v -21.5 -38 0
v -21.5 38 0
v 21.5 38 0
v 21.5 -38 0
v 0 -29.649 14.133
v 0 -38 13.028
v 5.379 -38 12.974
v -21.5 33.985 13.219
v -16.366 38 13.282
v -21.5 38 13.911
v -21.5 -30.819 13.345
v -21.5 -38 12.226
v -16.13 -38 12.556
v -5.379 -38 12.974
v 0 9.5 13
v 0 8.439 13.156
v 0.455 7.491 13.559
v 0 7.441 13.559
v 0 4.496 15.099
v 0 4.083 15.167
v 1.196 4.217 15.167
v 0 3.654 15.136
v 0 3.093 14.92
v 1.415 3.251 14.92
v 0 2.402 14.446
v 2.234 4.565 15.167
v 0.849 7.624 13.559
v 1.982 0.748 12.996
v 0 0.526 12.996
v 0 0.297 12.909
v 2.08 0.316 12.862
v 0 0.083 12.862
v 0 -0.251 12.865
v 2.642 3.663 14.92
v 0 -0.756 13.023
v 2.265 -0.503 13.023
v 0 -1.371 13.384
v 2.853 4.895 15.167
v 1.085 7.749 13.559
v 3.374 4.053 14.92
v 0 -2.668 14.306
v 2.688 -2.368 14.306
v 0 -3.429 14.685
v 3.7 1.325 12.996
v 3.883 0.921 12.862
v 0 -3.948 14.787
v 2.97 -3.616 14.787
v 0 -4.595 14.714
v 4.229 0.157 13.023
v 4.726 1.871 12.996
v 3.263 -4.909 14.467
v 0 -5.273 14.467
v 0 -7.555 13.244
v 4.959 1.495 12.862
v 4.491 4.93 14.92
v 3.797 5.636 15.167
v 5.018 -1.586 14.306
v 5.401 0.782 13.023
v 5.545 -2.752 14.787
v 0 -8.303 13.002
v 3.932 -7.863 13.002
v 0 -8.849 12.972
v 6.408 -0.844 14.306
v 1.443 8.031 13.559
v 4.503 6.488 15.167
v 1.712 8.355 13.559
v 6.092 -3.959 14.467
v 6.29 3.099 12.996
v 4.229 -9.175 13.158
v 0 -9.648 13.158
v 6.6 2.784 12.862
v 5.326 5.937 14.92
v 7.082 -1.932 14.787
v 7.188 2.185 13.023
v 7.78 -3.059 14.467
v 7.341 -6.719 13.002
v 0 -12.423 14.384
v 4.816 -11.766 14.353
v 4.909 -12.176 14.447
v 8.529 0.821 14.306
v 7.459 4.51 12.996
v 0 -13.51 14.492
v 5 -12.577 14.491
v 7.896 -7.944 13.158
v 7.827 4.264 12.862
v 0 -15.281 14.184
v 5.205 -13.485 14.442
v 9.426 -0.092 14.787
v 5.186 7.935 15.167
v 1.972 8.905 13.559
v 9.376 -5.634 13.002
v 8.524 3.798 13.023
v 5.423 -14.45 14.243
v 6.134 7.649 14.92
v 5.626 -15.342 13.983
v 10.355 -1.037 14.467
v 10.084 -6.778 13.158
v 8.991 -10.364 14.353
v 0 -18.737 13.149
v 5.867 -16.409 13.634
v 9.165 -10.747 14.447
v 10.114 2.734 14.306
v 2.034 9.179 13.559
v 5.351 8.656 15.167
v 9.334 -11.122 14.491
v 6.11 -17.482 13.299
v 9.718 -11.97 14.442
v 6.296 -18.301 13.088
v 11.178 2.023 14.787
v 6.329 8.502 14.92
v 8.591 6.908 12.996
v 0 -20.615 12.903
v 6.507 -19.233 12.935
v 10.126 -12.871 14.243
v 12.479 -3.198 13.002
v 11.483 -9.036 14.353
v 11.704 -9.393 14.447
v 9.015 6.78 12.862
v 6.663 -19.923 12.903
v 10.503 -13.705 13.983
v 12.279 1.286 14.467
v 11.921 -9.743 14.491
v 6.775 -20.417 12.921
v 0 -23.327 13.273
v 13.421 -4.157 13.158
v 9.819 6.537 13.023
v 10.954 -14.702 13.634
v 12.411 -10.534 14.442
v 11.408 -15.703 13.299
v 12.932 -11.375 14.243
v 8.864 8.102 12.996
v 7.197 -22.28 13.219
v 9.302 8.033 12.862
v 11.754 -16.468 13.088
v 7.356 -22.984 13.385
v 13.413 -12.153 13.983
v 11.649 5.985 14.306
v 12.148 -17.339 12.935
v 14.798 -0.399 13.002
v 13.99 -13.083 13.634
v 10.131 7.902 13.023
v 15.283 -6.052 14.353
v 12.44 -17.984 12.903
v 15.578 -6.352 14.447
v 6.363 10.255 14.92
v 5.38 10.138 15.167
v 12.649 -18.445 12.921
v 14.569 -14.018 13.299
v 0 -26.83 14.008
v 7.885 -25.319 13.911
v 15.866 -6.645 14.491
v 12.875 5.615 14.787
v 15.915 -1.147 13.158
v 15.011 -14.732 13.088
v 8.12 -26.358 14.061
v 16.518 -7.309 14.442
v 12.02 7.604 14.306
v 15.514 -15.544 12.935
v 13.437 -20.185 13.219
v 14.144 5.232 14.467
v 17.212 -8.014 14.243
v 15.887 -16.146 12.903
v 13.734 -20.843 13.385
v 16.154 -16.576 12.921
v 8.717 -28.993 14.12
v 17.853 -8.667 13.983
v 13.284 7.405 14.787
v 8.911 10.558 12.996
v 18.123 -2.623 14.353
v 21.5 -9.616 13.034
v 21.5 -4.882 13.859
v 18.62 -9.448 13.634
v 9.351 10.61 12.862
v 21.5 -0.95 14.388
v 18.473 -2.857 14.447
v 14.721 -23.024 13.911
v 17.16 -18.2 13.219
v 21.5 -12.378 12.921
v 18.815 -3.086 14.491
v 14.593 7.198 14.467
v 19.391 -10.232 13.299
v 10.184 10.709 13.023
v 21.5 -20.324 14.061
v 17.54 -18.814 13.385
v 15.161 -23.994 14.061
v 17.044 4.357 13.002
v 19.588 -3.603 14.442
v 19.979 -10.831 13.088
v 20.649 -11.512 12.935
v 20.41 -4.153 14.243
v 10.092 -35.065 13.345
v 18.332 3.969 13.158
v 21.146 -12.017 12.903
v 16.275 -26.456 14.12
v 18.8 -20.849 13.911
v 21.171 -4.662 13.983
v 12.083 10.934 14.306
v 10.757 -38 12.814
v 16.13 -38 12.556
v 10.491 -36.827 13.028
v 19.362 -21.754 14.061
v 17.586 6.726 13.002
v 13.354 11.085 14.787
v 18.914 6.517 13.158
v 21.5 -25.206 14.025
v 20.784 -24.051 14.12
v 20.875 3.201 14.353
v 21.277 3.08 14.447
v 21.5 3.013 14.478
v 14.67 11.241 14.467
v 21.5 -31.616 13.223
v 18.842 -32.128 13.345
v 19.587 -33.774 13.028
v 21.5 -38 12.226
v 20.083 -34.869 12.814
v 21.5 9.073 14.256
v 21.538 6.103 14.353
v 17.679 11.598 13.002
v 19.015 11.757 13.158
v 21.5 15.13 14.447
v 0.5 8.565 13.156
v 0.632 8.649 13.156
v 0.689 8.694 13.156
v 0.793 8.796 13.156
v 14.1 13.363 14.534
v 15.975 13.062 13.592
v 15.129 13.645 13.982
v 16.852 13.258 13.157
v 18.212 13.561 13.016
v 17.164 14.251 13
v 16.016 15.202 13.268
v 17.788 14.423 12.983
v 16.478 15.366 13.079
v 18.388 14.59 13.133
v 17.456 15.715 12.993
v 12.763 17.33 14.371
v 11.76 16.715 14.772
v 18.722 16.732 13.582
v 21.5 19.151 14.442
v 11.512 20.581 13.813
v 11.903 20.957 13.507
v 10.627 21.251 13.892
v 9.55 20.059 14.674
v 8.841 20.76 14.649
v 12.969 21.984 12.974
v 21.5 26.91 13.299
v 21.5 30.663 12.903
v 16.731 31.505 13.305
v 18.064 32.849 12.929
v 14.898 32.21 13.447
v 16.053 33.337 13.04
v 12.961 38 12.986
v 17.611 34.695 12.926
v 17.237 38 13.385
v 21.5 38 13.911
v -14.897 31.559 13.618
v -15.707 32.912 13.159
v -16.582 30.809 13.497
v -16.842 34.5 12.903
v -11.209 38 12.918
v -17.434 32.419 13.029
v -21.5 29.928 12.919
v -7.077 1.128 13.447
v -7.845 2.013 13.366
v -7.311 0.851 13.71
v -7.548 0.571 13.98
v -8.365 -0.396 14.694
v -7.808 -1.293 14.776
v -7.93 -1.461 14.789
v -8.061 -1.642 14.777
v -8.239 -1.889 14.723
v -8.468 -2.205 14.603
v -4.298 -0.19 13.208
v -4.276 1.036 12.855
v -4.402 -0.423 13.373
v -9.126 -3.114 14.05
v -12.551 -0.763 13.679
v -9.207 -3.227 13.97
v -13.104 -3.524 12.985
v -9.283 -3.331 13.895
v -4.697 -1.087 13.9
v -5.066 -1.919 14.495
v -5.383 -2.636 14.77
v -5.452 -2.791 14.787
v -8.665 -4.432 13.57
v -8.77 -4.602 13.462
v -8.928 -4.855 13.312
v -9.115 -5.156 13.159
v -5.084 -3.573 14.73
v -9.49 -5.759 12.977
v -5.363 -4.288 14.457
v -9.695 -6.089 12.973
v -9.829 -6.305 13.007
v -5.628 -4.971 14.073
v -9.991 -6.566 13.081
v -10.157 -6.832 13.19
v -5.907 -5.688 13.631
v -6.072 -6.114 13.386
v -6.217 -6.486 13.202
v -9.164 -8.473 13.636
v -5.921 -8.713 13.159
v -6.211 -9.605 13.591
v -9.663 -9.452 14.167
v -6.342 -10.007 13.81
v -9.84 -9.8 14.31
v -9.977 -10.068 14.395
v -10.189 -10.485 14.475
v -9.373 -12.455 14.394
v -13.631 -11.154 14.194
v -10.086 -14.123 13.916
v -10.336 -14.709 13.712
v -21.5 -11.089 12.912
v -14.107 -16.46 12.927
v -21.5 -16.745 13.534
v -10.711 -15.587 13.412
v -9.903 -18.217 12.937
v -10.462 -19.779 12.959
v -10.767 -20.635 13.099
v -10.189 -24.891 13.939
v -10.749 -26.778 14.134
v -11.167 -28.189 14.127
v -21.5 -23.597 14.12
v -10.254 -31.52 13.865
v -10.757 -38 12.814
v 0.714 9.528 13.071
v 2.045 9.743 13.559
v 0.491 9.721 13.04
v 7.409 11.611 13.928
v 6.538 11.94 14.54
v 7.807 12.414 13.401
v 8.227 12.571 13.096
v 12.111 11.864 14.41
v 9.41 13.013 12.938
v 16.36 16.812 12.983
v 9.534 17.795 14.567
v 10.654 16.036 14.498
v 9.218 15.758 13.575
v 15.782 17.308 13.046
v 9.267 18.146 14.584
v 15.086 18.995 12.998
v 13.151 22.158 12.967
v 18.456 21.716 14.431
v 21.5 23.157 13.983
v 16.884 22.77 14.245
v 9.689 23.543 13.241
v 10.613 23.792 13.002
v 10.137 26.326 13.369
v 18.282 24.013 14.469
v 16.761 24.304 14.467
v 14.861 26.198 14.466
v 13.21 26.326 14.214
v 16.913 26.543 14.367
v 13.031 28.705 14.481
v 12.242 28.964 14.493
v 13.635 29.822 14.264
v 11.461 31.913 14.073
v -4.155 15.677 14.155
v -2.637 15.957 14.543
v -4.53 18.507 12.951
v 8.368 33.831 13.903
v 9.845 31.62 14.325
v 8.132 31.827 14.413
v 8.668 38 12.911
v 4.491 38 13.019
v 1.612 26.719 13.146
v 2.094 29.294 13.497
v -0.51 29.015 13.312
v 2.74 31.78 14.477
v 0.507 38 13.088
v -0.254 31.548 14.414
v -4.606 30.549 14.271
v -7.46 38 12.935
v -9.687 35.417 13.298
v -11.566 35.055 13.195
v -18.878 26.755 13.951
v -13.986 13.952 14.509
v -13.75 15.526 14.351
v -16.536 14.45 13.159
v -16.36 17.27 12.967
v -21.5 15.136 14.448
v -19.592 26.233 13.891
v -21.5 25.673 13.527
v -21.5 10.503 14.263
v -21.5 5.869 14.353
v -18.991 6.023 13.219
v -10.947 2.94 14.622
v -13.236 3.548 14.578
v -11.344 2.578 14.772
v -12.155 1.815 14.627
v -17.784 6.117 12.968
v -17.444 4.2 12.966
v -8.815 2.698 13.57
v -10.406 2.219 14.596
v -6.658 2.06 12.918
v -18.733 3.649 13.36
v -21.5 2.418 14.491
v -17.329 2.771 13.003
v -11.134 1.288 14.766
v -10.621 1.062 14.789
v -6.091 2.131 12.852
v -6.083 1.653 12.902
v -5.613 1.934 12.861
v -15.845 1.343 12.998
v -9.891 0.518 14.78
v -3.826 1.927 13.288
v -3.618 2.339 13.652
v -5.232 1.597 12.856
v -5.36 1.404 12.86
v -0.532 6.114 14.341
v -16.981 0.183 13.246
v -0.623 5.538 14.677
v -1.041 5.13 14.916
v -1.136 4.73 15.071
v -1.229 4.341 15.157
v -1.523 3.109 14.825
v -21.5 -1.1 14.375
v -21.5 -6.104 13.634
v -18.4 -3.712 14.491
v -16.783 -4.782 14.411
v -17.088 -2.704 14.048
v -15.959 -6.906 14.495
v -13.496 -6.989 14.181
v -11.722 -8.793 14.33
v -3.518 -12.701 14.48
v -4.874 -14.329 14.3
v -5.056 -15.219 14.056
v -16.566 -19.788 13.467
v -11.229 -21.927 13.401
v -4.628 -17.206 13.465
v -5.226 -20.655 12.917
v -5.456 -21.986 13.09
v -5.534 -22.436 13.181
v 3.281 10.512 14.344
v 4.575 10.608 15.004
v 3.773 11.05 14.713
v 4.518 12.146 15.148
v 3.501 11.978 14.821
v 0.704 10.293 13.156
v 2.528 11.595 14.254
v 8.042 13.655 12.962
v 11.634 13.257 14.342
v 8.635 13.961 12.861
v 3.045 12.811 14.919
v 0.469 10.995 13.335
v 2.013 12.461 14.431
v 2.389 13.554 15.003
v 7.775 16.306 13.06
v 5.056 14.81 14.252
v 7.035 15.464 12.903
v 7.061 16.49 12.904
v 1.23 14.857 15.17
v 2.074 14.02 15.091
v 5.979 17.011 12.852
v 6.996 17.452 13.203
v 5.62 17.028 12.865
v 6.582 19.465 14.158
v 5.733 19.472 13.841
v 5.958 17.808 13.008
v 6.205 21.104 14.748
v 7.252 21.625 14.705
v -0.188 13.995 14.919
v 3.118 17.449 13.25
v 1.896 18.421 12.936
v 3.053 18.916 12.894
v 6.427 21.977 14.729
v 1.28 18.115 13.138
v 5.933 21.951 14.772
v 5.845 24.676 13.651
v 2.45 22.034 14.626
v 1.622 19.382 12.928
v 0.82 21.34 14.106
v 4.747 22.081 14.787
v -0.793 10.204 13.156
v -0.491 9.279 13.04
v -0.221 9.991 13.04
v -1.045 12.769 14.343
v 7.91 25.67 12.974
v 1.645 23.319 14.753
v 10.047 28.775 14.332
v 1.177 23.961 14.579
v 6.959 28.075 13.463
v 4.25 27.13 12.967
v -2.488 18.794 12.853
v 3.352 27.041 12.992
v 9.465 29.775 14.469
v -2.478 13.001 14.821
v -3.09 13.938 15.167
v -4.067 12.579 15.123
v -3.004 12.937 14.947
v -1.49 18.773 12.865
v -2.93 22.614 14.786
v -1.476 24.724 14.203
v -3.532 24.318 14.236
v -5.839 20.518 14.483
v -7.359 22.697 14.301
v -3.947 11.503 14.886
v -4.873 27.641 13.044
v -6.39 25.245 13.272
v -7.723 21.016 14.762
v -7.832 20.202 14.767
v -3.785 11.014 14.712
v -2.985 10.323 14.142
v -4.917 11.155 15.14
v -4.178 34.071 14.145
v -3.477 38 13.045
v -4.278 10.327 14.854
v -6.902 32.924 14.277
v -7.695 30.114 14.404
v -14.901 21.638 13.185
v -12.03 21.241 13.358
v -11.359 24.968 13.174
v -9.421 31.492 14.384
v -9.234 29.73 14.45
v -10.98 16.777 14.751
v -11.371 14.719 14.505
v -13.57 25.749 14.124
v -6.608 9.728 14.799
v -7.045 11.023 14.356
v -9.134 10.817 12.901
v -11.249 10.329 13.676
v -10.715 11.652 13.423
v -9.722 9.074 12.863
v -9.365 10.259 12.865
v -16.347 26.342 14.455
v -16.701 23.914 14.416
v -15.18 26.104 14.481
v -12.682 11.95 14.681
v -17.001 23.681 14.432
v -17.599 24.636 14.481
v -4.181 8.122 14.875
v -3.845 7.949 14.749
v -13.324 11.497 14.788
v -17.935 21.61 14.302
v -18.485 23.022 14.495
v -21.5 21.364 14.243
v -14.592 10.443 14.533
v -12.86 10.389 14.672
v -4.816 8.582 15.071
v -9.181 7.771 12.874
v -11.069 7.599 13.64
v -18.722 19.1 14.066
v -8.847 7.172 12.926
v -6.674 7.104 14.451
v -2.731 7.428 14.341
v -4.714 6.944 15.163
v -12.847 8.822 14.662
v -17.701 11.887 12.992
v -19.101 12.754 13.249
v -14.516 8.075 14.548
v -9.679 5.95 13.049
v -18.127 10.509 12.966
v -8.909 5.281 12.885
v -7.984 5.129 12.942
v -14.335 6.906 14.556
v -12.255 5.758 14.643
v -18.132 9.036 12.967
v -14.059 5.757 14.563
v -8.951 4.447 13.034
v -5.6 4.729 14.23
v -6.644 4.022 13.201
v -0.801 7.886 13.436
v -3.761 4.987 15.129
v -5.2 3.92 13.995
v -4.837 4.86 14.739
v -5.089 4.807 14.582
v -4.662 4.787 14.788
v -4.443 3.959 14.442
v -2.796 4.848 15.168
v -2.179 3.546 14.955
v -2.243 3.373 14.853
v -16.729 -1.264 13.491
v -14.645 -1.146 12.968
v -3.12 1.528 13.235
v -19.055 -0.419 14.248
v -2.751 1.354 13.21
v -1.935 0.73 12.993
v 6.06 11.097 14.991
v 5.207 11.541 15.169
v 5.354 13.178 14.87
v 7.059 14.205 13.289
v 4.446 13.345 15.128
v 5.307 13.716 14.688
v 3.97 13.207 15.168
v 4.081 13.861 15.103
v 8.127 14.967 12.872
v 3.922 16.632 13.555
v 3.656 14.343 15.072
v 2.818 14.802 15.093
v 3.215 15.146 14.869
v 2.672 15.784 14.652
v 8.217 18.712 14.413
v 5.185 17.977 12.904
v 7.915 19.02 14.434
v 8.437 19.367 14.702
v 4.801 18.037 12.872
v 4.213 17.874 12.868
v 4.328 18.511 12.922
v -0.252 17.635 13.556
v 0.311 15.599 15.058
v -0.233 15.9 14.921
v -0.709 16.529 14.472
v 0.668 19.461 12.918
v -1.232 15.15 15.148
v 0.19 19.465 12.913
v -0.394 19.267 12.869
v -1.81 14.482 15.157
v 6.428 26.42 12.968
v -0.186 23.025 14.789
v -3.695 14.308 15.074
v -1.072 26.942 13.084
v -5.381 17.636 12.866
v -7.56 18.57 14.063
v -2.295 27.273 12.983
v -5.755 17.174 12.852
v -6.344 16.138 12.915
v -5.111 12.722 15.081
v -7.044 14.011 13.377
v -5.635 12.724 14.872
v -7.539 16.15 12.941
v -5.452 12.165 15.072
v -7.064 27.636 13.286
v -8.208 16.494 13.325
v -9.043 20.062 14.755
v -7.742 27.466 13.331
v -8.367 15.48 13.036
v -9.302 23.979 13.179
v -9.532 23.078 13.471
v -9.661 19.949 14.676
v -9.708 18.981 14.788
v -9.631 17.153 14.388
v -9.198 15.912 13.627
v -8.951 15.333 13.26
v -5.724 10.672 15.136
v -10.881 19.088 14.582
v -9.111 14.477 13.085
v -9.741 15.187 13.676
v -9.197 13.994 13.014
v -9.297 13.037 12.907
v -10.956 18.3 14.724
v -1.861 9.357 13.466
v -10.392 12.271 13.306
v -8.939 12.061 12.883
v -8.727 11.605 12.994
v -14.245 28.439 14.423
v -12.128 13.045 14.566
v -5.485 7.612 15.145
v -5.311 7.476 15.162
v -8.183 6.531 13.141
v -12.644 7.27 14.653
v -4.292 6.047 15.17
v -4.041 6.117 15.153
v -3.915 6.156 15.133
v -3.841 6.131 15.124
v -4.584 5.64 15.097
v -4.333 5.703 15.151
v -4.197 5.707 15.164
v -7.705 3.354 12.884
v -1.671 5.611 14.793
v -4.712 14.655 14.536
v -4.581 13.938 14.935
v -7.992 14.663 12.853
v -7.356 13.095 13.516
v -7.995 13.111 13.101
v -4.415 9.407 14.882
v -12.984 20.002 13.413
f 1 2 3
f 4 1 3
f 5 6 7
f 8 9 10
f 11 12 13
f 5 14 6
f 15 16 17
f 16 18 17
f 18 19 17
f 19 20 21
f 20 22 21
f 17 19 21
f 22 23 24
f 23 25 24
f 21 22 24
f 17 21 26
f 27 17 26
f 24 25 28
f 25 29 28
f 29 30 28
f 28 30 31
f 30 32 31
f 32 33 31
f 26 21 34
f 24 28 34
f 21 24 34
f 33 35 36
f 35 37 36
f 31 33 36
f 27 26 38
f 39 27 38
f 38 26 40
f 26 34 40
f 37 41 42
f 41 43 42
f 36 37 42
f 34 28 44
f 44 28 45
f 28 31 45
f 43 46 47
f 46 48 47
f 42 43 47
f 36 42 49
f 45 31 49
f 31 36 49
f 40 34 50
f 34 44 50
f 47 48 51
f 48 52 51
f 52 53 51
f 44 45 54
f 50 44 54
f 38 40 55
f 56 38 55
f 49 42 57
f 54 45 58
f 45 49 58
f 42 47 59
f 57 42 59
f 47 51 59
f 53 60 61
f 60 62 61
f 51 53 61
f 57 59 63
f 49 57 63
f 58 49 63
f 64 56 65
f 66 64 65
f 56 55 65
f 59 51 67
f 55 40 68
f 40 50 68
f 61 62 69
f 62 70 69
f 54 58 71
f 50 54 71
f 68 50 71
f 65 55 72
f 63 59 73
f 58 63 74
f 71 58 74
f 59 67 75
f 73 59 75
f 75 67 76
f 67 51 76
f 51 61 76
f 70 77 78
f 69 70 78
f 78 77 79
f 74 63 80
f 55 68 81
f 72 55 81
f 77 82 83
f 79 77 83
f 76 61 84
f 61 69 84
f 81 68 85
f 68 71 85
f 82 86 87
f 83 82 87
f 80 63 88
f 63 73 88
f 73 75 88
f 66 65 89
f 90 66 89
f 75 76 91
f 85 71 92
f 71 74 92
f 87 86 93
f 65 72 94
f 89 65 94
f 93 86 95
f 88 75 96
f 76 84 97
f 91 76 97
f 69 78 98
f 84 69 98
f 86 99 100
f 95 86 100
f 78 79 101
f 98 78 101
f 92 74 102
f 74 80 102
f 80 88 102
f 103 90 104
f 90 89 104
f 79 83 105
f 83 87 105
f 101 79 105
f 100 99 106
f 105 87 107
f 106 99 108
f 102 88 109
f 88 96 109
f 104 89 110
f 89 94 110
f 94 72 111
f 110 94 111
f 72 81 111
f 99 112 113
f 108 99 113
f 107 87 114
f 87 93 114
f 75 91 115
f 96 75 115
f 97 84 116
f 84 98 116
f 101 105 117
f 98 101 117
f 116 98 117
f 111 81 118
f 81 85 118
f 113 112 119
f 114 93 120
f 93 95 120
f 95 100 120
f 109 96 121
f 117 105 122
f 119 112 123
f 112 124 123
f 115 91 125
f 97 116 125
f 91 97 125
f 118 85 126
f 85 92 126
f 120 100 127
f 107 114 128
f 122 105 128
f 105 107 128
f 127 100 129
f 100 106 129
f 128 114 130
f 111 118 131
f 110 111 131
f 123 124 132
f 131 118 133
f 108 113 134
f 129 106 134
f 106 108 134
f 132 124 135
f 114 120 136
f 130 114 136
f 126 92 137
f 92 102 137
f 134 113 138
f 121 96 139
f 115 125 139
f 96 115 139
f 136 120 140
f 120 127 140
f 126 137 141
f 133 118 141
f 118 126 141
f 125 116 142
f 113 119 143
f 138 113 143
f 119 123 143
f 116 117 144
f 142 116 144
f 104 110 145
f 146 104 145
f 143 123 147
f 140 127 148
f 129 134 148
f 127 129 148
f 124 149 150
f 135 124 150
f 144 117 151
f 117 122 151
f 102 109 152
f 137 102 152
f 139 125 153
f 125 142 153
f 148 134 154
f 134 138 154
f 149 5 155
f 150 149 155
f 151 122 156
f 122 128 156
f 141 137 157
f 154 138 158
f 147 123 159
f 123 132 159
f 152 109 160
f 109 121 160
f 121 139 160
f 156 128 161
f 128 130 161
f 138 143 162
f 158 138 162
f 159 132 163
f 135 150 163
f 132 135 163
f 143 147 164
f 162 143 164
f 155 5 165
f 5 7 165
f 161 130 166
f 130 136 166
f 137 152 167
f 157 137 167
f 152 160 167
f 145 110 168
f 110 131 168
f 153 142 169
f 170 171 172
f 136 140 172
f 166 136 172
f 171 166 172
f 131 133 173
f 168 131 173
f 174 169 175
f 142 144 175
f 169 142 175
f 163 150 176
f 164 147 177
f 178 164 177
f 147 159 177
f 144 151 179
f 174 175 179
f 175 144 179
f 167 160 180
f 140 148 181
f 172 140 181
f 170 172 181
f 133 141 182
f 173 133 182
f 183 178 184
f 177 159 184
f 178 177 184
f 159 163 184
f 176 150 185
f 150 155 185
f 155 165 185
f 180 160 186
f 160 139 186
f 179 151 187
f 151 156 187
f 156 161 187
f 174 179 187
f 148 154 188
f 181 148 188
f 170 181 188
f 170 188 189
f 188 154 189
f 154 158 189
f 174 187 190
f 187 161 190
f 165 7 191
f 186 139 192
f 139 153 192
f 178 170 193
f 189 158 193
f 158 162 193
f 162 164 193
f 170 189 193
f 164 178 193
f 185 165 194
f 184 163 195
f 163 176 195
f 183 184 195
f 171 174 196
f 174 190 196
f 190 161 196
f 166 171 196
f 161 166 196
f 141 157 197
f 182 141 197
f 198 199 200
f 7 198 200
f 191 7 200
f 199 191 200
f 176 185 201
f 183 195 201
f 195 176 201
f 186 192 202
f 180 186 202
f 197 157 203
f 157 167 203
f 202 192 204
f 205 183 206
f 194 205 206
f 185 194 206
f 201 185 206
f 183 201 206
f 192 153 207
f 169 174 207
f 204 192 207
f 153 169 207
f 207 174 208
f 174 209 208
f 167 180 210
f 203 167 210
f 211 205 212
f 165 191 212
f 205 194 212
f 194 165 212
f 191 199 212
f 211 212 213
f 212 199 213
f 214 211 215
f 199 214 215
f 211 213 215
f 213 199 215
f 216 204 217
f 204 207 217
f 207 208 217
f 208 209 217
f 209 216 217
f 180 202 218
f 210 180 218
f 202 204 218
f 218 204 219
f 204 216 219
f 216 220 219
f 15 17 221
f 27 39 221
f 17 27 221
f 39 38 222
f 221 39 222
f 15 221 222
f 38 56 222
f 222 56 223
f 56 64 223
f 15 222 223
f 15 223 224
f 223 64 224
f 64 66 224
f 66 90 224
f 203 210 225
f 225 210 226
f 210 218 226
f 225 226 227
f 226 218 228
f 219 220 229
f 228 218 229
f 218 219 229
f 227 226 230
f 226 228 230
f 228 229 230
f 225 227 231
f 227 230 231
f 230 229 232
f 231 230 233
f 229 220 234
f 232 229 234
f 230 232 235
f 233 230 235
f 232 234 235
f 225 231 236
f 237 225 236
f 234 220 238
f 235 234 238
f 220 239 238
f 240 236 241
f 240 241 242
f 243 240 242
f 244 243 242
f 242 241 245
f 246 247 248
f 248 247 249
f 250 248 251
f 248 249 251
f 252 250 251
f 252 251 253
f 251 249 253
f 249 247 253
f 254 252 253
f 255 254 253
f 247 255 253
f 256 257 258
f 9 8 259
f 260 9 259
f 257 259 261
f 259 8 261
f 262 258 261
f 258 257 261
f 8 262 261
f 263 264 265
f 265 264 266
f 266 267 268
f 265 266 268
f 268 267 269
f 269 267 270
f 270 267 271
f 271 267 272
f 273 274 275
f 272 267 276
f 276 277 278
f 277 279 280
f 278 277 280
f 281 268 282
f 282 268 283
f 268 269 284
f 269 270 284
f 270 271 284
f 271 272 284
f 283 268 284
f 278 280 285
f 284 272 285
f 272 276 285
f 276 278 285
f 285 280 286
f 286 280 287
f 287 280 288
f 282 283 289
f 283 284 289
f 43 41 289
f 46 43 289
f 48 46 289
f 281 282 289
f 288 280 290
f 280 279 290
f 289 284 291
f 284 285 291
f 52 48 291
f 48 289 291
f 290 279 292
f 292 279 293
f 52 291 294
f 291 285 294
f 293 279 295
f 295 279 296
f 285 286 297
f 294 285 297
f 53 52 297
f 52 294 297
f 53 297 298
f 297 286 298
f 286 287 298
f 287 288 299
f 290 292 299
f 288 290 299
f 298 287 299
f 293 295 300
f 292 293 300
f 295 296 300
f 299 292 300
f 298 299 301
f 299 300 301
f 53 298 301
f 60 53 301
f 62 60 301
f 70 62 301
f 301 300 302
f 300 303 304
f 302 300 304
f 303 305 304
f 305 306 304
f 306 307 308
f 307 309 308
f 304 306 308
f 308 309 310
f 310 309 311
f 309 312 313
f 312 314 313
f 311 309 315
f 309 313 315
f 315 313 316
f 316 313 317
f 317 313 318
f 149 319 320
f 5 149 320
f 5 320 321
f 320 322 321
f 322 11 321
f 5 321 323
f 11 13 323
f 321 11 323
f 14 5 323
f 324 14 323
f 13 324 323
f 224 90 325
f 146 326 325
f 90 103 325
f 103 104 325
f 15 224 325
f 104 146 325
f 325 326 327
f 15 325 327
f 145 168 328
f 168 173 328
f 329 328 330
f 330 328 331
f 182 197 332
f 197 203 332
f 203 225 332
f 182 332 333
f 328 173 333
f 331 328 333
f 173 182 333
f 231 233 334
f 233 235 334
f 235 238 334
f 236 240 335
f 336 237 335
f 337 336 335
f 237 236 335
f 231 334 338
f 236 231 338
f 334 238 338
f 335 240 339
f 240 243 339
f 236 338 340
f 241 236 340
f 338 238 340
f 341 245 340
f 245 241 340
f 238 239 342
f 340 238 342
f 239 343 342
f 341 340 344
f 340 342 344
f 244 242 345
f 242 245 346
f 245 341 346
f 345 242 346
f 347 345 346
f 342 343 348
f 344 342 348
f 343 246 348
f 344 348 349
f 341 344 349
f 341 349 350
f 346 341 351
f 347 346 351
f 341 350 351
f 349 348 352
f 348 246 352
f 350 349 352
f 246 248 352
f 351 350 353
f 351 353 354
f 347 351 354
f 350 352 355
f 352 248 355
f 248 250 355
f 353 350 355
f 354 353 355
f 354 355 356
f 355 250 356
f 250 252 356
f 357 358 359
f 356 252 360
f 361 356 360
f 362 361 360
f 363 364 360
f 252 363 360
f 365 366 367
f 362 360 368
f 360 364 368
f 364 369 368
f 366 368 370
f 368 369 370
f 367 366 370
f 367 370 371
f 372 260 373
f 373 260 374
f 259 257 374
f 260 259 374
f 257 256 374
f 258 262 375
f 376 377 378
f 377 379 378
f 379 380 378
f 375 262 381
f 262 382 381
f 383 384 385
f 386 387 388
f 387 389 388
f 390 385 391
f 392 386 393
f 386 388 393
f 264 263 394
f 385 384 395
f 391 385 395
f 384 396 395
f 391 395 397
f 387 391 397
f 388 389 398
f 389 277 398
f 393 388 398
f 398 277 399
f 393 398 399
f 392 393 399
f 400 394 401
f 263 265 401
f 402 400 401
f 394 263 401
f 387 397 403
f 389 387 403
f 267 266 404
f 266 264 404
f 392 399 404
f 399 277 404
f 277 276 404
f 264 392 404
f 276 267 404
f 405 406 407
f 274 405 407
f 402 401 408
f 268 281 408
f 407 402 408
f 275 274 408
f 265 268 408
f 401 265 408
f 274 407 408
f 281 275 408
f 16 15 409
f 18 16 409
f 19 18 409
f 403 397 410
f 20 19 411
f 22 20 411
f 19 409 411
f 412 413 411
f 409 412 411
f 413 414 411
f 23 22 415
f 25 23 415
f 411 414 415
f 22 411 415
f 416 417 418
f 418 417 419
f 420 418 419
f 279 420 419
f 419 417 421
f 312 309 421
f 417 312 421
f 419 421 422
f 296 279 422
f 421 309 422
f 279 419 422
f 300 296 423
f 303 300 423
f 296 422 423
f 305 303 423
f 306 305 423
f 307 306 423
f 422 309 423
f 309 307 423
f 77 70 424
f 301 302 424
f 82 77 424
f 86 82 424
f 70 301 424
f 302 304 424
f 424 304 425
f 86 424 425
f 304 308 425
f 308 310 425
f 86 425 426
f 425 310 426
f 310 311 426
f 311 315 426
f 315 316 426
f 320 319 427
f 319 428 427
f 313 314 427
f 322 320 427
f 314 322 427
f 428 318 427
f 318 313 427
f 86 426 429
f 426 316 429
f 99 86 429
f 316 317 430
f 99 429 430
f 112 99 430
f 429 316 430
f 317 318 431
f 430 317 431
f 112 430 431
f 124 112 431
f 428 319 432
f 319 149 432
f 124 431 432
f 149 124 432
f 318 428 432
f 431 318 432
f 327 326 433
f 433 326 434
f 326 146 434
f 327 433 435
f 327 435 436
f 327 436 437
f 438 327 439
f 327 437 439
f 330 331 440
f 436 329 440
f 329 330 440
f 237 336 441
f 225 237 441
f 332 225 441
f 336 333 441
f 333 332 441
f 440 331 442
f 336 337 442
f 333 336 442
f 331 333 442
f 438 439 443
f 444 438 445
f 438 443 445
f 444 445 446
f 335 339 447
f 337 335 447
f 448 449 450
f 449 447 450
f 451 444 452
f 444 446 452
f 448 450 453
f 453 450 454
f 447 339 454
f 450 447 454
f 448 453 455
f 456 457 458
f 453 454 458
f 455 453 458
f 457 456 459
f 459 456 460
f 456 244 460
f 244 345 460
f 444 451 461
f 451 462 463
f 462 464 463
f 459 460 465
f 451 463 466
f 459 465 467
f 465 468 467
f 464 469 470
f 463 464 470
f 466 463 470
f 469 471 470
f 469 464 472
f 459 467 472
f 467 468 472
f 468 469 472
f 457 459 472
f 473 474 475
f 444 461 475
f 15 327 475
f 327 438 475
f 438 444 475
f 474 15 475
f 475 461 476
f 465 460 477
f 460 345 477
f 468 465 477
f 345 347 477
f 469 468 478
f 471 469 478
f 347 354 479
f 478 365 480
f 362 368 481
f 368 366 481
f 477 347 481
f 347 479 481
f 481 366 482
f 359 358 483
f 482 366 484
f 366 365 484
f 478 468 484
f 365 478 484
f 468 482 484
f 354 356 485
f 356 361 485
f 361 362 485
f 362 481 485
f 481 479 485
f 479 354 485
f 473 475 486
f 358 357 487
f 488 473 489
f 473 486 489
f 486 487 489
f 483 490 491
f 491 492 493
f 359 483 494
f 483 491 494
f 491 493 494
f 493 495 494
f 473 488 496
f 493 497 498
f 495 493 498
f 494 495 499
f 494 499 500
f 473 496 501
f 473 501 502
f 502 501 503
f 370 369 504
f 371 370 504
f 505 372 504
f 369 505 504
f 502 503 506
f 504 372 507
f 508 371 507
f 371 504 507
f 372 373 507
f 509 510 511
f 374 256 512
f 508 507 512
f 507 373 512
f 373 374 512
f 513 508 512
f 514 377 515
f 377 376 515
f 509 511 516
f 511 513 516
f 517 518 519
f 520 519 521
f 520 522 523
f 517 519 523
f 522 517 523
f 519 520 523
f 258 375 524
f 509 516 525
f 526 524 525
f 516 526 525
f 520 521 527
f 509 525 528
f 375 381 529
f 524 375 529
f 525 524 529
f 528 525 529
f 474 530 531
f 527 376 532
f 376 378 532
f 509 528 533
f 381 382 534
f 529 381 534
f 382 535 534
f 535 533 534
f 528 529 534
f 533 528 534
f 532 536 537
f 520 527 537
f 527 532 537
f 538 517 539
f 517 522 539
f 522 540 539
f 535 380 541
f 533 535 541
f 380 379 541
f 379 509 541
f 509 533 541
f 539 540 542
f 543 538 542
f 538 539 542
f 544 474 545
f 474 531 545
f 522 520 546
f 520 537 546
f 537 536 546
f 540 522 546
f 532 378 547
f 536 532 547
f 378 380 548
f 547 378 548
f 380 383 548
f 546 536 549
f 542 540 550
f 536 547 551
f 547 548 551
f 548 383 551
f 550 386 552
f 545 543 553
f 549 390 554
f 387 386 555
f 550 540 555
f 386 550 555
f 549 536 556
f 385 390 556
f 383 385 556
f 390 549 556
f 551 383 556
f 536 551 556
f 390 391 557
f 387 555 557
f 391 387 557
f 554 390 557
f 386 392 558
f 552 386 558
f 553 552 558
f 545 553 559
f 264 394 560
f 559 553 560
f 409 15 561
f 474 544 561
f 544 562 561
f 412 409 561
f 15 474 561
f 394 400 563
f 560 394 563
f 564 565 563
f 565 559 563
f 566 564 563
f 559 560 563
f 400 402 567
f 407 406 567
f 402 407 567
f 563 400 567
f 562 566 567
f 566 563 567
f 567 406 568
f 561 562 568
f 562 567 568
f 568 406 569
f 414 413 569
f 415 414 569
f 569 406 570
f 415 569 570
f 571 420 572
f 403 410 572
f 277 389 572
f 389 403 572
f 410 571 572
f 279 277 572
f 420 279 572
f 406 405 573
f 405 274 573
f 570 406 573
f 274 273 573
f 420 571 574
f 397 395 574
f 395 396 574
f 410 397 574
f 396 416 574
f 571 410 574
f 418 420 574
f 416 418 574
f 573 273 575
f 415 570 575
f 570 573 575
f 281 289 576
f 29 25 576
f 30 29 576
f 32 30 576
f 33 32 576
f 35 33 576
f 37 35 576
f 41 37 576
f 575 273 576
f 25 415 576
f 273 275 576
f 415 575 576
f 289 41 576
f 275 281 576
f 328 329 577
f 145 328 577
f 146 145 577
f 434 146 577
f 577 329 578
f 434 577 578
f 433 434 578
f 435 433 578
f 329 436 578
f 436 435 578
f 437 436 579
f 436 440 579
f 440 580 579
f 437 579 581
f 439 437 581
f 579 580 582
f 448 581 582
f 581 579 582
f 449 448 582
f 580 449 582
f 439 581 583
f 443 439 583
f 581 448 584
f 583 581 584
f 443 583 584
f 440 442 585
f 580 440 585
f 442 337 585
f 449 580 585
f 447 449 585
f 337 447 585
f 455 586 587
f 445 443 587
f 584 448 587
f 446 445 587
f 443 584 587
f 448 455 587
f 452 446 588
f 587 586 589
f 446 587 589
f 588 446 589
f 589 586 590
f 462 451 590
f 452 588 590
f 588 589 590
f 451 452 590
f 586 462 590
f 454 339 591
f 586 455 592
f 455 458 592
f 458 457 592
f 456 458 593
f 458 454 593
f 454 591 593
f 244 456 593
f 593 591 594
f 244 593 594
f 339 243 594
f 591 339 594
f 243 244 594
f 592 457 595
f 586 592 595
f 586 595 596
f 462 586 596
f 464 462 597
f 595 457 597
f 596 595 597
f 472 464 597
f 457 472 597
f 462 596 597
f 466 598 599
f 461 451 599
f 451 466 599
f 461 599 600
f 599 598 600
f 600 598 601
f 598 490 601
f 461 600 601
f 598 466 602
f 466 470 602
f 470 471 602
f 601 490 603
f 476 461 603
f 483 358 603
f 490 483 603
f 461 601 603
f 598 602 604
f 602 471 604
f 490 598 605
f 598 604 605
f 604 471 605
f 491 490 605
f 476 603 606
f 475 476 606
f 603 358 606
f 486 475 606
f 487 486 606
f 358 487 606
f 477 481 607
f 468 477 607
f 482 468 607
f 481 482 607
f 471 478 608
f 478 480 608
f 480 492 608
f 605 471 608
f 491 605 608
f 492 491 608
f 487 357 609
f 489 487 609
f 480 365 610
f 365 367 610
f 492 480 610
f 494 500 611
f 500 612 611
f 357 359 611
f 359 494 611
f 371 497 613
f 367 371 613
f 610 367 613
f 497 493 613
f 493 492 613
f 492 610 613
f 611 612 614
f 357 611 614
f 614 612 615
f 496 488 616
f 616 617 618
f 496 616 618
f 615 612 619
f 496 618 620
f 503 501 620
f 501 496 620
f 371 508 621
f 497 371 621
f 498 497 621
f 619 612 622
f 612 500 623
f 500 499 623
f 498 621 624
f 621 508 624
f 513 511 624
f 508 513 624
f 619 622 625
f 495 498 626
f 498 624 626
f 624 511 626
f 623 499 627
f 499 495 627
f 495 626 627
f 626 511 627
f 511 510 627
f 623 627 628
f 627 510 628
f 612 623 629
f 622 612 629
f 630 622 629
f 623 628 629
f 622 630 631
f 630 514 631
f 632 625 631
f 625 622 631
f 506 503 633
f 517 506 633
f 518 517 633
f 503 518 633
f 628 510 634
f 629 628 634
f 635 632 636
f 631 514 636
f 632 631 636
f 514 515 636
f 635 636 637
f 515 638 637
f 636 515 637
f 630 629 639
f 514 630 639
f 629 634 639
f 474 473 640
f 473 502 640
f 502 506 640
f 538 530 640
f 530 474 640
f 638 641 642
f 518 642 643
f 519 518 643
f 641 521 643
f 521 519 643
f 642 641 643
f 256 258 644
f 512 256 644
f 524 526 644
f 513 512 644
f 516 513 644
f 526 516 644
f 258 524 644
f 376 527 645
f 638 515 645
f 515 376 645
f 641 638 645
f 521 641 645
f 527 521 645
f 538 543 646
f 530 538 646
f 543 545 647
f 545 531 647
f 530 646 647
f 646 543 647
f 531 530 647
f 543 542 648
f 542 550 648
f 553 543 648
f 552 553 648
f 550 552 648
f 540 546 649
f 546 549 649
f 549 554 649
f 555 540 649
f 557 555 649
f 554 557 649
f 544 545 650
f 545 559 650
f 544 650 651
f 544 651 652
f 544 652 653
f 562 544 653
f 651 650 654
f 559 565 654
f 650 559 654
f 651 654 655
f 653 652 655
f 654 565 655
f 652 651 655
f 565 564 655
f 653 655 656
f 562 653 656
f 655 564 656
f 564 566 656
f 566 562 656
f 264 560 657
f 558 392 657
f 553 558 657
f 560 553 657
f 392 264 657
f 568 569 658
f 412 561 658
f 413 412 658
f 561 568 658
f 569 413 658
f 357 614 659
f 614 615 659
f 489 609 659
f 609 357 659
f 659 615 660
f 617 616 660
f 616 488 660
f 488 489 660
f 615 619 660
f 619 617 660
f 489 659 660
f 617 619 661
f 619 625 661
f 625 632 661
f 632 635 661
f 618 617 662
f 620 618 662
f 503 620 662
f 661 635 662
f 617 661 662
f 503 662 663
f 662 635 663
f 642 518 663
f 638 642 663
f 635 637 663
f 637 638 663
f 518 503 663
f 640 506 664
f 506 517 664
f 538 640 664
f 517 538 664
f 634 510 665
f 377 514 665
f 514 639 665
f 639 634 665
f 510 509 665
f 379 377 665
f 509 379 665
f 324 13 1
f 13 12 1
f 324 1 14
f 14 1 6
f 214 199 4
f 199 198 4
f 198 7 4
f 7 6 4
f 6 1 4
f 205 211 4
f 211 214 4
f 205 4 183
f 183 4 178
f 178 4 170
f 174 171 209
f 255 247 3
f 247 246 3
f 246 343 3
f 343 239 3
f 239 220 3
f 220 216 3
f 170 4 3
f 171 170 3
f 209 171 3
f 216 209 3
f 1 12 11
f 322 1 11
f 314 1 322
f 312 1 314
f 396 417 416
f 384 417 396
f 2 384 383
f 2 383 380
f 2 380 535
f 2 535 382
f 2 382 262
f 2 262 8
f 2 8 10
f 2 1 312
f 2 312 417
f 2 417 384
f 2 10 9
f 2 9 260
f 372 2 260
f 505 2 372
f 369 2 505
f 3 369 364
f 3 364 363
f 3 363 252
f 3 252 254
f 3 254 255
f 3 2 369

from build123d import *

# Parameters (mm, degrees)
F0_W     = 43
F0_H     = 76
F1_DEPTH = 12
F5_DEPTH = 25


with BuildPart() as f1:
    # F0 (on Top) → F1 (new body)
    with BuildSketch(Plane.XY):
        Rectangle(F0_W, F0_H)
    extrude(amount=F1_DEPTH)

    # F3 (on Right) → F4 (revolve)
    with BuildSketch(Plane.YZ):
        with BuildLine():
            Line((-44.1283285618, 12), (9.5, 12))
            Line((9.5, 12), (9.5, 13))
            add(Edge.make_bspline(
                [(9.5, 13), (7.2259709093, 12.9839292355), (3.8143336998, 17.3923027091), (0.0559037939, 10.903183264), (-3.8044043801, 16.6240806281), (-8.5884909723, 11.3816701472), (-12.7677373796, 15.9904534972), (-20.2609269277, 11.5681742154), (-27.8215516911, 15.5335878921), (-38.0023366763, 12.8770661415), (-44.1283285618, 12)],
                knots=[0, 0, 0, 0, 0.1201180453, 0.2223436831, 0.3231585069, 0.43149146, 0.5353595882, 0.666400511, 0.8015197875, 1, 1, 1, 1], degree=3))
        make_face()
    revolve(axis=Axis((0, 9.5, 12.5), (0, 0, 1)))

    # F5 (cut): a face of the model
    f5_faces = [f1.faces().sort_by_distance(p)[0] for p in [
        (0, 61.6114903702, 12),
    ]]
    extrude(f5_faces, amount=-F5_DEPTH, mode=Mode.SUBTRACT)


solid = f1.part
